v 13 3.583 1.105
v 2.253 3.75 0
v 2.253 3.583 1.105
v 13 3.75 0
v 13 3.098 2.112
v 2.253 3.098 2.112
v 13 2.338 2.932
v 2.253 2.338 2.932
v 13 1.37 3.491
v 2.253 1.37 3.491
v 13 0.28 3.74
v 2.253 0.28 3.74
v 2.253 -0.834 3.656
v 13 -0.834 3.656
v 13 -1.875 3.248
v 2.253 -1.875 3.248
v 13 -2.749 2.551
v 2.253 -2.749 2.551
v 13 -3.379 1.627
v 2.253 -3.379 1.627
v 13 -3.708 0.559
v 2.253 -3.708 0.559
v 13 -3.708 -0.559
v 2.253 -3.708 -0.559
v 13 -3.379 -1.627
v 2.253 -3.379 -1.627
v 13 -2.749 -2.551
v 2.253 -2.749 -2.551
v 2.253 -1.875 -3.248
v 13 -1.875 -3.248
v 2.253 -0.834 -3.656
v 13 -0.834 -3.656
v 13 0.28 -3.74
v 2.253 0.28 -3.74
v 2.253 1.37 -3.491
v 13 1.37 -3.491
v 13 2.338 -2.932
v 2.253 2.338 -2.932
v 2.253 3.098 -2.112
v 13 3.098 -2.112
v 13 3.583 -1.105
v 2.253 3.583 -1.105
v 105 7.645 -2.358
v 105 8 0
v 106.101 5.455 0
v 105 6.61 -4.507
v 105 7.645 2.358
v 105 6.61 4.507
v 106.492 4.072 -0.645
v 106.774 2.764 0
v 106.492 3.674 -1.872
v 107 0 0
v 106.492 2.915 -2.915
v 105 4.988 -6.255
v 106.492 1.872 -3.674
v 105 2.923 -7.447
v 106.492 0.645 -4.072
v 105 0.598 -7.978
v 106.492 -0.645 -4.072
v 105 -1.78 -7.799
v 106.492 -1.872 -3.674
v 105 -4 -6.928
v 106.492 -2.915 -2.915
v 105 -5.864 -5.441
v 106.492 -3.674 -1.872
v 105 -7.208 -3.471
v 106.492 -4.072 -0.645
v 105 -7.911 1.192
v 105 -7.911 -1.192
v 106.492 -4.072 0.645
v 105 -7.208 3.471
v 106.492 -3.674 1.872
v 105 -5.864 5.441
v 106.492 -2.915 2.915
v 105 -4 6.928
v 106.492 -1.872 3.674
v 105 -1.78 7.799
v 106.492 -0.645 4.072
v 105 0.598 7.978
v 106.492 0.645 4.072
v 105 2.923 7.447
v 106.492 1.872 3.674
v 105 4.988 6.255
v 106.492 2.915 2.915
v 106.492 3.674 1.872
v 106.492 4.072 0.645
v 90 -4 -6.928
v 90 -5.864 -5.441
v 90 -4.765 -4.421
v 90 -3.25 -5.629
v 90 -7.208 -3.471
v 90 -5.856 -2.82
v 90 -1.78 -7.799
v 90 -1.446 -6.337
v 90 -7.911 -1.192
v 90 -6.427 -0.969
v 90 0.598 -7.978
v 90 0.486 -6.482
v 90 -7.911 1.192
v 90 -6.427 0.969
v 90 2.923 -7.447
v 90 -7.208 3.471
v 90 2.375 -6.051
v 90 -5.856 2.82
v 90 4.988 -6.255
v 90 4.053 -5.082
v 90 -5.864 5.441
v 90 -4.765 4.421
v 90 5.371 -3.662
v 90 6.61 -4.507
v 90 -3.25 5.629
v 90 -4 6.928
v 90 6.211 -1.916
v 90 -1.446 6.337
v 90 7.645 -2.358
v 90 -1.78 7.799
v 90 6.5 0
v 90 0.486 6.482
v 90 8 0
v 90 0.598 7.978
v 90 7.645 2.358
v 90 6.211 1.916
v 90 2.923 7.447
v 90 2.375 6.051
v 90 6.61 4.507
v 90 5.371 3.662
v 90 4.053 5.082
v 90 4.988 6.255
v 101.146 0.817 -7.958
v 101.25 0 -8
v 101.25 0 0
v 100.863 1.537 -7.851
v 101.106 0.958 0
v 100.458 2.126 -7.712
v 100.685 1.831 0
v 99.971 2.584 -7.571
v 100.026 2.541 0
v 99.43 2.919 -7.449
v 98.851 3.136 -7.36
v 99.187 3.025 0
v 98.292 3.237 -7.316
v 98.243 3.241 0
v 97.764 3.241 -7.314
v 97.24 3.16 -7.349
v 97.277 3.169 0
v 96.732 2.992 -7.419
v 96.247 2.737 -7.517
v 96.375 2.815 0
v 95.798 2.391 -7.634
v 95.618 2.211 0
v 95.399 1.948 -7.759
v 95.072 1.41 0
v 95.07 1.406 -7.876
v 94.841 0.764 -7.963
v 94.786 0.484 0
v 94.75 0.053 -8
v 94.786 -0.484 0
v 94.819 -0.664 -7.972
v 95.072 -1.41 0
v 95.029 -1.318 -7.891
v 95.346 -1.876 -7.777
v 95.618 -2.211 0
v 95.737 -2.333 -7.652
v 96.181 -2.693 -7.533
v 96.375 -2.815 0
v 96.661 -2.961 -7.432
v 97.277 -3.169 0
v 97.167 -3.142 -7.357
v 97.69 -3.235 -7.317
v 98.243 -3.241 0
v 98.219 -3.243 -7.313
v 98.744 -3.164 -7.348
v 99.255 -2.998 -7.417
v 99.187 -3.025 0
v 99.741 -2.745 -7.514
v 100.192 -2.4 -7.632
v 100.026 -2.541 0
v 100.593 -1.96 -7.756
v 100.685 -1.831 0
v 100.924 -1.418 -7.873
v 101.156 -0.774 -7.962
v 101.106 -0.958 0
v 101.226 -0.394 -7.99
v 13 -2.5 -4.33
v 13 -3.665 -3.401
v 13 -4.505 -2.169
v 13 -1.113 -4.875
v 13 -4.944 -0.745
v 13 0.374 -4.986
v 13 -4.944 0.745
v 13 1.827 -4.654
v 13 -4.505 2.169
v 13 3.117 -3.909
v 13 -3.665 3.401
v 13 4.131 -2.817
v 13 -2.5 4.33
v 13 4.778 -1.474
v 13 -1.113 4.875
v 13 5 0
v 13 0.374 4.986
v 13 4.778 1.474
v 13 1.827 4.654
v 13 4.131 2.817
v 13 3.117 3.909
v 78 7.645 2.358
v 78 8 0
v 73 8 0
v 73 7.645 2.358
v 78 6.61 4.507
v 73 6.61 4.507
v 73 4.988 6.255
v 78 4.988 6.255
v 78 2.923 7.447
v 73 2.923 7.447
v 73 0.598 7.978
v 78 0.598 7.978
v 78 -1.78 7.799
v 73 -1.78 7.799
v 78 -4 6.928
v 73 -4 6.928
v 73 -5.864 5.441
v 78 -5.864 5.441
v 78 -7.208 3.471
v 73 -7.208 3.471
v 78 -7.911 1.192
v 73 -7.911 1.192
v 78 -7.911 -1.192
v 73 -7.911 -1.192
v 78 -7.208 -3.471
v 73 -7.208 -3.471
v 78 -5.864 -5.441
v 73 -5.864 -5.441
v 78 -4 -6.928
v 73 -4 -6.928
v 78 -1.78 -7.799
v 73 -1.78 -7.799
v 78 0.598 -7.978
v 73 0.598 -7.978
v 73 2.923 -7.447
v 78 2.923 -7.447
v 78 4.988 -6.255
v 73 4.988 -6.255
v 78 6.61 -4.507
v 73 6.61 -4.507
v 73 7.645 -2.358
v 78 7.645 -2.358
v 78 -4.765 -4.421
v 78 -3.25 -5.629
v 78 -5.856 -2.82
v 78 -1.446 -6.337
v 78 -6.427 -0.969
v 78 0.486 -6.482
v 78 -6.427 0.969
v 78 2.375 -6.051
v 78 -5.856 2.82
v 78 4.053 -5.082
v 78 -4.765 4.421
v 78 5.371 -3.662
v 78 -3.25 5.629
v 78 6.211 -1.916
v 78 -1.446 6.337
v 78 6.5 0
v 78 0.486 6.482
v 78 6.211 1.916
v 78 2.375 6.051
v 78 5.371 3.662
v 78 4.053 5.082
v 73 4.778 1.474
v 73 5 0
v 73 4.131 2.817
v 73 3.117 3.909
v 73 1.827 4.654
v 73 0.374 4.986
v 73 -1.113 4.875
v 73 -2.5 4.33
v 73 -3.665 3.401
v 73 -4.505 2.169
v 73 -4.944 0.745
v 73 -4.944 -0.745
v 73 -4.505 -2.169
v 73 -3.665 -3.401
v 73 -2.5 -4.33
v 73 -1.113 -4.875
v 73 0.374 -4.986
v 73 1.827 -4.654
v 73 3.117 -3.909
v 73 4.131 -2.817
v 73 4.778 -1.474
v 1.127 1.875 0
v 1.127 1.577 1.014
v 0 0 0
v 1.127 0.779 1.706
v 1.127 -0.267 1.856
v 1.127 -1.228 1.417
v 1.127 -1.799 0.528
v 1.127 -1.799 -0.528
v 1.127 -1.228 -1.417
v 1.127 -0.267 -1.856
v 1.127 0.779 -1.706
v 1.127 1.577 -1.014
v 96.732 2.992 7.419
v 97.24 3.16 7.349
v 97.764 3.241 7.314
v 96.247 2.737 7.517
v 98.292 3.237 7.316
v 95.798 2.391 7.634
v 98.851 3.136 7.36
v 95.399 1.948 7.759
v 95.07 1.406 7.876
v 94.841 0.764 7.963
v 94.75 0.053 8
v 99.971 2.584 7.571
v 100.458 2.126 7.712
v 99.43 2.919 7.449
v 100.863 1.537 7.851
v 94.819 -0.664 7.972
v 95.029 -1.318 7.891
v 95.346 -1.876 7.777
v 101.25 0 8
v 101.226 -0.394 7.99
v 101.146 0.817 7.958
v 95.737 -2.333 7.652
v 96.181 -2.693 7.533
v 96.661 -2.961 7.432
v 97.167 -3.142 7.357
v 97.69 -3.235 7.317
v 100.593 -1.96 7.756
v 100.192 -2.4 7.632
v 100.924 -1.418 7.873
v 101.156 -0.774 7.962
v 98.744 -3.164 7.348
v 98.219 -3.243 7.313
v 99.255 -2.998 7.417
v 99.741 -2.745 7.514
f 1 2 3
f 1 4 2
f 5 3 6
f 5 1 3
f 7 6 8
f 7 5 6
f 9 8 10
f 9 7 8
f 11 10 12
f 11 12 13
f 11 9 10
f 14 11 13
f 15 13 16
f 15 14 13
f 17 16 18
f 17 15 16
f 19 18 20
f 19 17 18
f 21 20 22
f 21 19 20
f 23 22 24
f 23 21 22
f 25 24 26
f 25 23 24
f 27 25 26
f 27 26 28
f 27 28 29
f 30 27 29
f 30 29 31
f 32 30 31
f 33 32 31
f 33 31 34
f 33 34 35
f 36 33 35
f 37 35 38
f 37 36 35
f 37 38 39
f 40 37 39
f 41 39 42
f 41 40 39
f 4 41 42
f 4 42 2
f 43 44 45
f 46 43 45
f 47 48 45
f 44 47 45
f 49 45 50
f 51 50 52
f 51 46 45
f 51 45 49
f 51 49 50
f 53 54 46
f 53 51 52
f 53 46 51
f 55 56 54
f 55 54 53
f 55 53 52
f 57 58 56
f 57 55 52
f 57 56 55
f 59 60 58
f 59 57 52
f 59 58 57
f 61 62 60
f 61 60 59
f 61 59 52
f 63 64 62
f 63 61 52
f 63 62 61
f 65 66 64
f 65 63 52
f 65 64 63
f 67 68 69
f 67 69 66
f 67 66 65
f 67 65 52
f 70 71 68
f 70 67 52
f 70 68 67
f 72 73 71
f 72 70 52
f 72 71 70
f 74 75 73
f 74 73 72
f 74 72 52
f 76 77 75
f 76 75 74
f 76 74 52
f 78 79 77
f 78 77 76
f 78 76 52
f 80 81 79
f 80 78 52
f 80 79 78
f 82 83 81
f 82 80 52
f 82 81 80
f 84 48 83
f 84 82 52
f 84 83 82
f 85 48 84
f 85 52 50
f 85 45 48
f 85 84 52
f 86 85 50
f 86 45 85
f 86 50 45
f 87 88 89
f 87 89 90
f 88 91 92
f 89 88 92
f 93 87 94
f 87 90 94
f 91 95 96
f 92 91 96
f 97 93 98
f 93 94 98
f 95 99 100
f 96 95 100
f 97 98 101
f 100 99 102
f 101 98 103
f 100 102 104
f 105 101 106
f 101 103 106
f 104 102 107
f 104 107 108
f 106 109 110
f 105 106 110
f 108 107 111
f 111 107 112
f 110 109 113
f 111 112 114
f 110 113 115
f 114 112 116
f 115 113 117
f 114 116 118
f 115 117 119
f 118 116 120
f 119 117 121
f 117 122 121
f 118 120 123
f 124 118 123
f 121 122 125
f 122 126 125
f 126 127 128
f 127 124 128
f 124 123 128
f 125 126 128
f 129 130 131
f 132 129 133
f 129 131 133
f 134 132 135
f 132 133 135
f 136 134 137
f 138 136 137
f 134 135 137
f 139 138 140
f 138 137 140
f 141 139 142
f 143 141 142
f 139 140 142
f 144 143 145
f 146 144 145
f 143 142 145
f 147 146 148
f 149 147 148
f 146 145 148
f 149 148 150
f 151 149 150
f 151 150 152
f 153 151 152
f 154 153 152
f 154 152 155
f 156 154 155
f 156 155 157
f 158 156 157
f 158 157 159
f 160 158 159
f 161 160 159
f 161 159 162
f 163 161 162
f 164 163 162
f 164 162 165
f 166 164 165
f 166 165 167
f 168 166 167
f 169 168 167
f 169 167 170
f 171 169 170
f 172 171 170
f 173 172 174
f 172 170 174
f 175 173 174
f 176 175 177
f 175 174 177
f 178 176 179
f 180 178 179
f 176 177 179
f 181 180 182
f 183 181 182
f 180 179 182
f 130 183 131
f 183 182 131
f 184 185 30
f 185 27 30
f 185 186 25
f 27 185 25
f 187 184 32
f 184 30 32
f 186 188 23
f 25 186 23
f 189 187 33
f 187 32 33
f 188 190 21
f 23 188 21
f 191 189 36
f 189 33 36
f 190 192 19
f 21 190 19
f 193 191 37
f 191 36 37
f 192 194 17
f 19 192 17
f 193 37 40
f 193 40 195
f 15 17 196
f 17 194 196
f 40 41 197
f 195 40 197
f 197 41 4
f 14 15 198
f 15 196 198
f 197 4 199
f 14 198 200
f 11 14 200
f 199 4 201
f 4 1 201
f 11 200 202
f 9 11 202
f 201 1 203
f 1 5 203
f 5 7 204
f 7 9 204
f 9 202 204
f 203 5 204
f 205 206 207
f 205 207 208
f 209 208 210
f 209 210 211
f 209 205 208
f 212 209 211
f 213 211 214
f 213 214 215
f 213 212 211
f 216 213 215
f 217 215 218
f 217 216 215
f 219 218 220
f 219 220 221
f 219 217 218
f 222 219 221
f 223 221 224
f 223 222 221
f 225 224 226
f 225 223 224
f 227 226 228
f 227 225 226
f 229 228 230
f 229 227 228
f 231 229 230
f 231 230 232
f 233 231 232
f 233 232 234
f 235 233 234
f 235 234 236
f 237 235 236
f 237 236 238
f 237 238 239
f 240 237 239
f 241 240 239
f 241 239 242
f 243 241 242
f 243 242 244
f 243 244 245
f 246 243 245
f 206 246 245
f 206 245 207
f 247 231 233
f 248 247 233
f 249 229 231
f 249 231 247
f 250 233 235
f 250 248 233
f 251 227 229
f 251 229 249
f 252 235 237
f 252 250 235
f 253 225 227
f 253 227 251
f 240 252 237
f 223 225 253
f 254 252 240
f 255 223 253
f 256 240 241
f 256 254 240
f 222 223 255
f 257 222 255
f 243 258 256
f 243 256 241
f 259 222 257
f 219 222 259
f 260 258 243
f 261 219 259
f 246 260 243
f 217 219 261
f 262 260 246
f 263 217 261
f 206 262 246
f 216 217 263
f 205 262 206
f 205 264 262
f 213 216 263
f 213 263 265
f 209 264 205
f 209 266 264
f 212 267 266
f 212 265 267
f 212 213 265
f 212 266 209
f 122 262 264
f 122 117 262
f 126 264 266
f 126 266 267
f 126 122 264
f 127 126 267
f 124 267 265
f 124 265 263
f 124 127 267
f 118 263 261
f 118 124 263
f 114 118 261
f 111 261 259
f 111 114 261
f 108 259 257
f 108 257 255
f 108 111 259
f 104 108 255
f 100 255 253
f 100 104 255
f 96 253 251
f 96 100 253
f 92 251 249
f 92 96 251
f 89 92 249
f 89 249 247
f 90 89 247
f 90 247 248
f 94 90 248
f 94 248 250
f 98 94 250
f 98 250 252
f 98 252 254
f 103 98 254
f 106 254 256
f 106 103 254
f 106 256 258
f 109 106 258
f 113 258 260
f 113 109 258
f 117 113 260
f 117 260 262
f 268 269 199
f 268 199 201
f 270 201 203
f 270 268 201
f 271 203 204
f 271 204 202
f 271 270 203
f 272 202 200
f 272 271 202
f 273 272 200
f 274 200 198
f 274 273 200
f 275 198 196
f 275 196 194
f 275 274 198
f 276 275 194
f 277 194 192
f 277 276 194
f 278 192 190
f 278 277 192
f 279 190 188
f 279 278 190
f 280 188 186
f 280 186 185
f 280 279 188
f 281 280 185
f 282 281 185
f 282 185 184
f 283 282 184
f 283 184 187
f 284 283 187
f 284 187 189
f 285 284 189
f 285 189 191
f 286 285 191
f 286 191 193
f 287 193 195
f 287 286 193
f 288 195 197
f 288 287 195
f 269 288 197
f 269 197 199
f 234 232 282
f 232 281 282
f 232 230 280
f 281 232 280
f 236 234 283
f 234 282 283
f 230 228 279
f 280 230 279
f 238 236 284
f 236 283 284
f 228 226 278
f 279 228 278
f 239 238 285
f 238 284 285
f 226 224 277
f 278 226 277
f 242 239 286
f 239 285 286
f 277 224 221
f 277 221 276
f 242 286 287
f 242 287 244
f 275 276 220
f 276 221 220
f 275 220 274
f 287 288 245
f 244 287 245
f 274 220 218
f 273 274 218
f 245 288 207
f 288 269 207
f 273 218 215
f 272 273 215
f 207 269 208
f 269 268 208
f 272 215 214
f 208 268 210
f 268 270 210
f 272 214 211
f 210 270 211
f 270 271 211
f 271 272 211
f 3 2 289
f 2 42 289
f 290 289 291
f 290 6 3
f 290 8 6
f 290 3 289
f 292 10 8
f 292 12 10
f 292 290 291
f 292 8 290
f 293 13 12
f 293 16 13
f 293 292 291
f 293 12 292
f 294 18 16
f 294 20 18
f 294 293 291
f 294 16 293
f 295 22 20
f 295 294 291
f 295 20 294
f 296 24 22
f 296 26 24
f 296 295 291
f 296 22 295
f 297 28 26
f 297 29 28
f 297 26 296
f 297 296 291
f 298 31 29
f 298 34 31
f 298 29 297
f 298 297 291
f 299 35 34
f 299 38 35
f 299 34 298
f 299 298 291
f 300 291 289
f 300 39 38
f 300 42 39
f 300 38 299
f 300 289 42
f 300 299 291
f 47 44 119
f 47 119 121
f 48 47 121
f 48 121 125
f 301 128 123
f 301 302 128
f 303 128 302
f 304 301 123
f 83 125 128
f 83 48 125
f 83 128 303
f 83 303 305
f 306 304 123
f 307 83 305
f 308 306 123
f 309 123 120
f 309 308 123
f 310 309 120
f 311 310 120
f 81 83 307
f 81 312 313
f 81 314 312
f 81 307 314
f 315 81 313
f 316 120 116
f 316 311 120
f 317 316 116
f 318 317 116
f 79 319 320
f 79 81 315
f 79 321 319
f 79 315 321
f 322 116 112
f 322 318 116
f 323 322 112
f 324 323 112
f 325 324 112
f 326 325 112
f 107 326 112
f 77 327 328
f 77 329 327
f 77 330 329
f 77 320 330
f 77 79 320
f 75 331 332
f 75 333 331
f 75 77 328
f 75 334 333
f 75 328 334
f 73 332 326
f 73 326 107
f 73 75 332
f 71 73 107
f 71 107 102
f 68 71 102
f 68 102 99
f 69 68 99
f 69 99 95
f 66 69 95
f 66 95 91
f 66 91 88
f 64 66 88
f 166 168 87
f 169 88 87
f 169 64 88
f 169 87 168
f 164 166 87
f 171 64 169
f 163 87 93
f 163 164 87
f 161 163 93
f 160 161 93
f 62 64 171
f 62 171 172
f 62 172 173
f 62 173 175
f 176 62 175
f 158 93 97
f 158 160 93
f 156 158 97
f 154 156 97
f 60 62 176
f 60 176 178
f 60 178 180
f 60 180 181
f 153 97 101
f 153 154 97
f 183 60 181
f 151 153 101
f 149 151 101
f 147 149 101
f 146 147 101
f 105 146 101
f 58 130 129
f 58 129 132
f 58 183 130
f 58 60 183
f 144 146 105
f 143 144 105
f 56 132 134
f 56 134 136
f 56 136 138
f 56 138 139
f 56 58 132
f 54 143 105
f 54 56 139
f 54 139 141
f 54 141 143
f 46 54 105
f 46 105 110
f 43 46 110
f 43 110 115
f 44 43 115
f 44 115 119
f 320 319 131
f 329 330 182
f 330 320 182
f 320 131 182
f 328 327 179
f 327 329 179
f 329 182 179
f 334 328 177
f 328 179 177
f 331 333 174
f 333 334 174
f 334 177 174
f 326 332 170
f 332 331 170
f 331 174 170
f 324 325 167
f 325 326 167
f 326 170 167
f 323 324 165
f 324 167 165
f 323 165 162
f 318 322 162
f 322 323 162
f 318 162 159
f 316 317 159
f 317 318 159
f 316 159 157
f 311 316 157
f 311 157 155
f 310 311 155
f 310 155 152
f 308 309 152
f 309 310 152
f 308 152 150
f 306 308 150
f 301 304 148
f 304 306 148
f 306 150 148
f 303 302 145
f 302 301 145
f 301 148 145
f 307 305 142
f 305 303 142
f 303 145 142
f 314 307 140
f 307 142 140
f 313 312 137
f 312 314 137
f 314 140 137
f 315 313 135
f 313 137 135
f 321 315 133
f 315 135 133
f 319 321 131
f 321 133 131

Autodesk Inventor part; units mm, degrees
ref_plane "YZ Plane" through (0, 0, 0) normal (1, 0, 0) x (0, 1, 0)
ref_plane "XZ Plane" through (0, 0, 0) normal (0, 1, 0) x (-1, 0, 0)
sketch "Esboço1" plane through (0, 0, 0) normal (0, 0, 1) x (1, 0, 0)
  line L0 (0, 0) -> (107, 0)
  line L1 (0, 0) -> (2.2532, 3.75)
  line L2 (0, 0) -> (4.3749, 0) construction
  line L3 (2.2532, 3.75) -> (13, 3.75)
  line L4 (13, 3.75) -> (13, 5)
  line L5 (13, 5) -> (73, 5)
  line L6 (73, 5) -> (73, 8)
  line L7 (73, 8) -> (78, 8)
  line L8 (78, 8) -> (78, 6.5)
  line L9 (78, 6.5) -> (90, 6.5)
  line L10 (90, 6.5) -> (90, 8)
  line L11 (90, 8) -> (105, 8)
  arc A0 (107, 0) -> (105, 8) centre (90, 0) ccw
  dimension "d14" = 107
  dimension "d15" = 59
  dimension "d17" = 1.25
  dimension "d19" = 3
  dimension "d20" = 5
  dimension "d21" = 12
  dimension "d22" = 15
  dimension "d24" = 13
  dimension "d25" = 1.5
  dimension "d26" = 7.5
  dimension "d37" = 34
revolve "Revolução1" add sketch "Esboço1" angle 360 about axis through (0, 0, 0) along (1, 0, 0)
thread "Rosca1" size "M10x1.5" class "6g" standard "ANSI Metric M Profile" full length
sketch "Esboço3" plane through (0, 0, 0) normal (0, 0, 1) x (1, 0, 0)
  circle A0 centre (98, 0) radius 3.25
  arc A1 (105, -8) -> (105, 8) centre (90, 0) ccw projected
  arc A2 (105, -8) -> (105, 8) centre (90, 0) ccw projected
  line L0 (105, -8) -> (105, 8) projected
  point P0 (0, 0)
  dimension "d30" = 6.5
  dimension "d34" = 7
extrude "Extrusão1" cut sketch "Esboço3" along normal through all both and the other way through all contours A0
properties part number "Parafuso2"
